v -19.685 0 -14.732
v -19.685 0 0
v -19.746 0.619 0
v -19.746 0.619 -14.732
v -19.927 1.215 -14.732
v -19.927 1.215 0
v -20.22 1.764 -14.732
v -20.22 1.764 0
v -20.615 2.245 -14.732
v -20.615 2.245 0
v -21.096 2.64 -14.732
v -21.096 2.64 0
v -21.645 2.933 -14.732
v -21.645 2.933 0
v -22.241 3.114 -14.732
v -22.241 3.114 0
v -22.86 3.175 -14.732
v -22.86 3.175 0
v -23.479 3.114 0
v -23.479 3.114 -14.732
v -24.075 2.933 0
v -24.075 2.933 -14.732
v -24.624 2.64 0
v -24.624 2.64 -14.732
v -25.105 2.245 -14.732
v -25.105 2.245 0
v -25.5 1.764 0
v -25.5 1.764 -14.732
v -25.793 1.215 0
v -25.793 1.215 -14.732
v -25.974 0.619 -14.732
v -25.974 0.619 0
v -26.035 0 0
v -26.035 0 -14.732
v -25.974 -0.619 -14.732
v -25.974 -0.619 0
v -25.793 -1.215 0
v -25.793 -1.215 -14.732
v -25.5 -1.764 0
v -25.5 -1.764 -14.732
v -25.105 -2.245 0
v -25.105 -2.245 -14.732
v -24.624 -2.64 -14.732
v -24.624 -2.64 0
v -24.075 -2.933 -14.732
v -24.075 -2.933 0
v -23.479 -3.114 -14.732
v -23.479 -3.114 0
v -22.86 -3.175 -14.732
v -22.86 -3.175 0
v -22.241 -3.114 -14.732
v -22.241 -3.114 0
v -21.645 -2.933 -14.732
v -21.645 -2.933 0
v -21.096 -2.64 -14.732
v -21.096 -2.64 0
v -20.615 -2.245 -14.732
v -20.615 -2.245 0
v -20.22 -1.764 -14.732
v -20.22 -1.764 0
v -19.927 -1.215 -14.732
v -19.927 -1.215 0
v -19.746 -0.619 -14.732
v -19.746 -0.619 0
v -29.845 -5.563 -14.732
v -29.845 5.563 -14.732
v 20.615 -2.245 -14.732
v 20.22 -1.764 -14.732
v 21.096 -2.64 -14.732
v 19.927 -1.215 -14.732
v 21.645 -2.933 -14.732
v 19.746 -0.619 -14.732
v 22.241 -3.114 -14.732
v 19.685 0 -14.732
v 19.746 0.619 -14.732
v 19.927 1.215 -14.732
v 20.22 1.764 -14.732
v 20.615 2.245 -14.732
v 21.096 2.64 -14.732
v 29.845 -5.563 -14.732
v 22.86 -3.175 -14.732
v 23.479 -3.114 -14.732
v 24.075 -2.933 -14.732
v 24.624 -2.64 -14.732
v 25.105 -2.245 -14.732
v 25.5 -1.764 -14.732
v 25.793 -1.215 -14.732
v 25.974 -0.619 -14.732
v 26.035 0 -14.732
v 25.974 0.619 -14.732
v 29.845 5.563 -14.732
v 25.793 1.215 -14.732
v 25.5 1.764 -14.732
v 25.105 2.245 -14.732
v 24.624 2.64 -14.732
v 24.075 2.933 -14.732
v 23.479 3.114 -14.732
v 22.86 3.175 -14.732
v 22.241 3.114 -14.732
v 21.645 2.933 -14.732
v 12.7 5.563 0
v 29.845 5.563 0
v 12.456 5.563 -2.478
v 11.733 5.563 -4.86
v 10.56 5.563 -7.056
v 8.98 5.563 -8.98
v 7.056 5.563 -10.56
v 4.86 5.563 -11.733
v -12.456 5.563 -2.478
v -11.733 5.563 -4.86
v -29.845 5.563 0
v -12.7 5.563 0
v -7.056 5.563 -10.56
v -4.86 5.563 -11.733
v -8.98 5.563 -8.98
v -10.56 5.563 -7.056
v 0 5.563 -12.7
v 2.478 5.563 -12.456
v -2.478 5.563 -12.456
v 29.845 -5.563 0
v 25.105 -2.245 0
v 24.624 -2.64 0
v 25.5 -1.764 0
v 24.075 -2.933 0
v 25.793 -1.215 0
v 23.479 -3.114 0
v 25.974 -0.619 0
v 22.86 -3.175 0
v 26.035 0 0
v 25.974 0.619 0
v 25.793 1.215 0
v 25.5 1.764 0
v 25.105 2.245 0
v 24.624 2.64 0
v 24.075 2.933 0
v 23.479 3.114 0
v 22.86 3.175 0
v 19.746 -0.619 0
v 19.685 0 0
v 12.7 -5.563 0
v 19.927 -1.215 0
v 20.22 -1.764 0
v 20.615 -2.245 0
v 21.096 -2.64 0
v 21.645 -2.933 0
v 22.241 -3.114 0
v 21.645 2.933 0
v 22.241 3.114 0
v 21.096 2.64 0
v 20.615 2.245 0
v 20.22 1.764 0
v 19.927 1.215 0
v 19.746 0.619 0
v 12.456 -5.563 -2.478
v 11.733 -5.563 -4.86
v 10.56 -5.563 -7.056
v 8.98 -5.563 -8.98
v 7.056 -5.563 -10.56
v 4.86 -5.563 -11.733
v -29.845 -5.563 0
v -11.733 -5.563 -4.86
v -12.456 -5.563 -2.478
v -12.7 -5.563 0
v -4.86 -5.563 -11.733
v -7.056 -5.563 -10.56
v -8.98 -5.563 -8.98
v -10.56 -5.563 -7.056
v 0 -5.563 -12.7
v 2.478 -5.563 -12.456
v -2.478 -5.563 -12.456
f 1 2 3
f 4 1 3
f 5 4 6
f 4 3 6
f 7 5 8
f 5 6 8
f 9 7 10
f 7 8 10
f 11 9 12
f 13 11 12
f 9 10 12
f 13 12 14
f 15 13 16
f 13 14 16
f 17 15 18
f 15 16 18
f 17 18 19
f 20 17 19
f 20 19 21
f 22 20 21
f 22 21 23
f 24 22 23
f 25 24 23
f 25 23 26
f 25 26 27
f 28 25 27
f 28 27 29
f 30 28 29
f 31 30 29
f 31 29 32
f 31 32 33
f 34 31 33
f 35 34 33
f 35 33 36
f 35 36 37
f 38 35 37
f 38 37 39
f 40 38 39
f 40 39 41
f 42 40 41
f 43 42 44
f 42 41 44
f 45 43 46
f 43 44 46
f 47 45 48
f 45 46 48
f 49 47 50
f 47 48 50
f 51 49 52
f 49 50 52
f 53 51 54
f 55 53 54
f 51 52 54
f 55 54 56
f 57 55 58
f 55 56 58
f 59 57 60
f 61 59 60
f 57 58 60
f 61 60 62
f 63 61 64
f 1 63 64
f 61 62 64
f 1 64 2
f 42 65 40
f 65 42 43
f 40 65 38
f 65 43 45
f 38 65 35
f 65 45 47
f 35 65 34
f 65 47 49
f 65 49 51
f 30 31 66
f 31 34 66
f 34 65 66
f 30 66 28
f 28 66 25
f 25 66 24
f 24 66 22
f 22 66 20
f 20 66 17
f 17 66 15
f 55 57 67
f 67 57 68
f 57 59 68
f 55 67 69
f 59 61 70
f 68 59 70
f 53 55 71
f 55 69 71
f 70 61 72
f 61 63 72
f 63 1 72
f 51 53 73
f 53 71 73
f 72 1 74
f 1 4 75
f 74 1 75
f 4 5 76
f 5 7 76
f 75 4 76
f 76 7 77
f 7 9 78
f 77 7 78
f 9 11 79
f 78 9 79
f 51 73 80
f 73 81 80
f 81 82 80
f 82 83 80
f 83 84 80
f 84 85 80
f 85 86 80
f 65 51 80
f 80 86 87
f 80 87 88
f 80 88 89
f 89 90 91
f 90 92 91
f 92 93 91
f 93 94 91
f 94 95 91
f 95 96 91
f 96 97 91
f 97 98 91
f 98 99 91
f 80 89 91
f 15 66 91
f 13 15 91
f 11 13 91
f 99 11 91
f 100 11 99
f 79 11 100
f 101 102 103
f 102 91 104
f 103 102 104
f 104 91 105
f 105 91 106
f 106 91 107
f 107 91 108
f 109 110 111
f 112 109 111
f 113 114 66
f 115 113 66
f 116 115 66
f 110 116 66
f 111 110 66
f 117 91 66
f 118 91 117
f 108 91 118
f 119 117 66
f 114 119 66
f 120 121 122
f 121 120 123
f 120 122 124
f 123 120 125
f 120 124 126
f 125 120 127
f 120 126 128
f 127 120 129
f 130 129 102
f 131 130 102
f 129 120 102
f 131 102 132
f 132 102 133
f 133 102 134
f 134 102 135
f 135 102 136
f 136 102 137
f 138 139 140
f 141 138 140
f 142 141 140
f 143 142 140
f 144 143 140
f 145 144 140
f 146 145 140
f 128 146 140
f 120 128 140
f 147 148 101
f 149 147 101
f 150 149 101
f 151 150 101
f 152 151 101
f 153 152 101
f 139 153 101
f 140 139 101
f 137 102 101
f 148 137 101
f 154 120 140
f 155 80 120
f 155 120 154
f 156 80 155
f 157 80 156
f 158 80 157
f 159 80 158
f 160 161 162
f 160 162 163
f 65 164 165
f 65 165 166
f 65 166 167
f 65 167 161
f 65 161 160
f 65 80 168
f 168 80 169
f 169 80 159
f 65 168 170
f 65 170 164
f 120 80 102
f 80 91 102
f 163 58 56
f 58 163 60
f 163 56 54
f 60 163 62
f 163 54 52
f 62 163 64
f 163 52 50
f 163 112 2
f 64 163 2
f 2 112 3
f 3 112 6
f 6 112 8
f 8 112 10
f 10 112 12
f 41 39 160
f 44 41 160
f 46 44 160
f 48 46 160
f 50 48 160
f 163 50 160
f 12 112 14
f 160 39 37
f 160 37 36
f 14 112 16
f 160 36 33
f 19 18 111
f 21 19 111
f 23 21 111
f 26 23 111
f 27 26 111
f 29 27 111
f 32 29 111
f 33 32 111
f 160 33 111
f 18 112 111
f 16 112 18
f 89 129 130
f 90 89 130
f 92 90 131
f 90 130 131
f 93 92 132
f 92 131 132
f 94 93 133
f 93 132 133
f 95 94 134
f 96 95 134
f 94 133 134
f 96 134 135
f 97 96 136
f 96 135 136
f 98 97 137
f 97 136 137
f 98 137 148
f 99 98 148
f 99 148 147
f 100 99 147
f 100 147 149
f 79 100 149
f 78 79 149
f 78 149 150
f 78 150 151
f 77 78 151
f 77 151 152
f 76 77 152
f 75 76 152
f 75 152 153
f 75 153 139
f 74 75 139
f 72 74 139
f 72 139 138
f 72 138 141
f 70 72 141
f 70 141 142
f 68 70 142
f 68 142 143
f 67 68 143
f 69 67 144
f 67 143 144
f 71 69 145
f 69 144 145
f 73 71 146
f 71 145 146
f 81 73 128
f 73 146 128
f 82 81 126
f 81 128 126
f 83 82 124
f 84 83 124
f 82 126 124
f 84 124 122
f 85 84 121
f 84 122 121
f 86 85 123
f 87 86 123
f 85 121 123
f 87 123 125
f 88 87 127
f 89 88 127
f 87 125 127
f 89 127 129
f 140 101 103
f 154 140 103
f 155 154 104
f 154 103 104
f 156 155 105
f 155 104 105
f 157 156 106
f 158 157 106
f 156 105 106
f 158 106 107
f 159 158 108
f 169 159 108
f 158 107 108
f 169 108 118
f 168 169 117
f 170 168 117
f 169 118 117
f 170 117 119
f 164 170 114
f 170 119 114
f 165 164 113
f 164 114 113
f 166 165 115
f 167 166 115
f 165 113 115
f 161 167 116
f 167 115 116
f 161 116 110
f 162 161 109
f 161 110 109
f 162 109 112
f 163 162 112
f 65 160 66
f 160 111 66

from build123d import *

# Parameters (mm, degrees)
BOSS_EXTRUDE1_DEPTH = 5.5626
SKETCH2_R           = 3.175
CUT_EXTRUDE1_DEPTH  = 34.744605017


with BuildPart() as part:
    # Sketch1 → Boss-Extrude1 (new, symmetric)
    with BuildSketch(Plane(origin=(0, 0, 0), x_dir=(1, 0, 0), z_dir=(0, 1, 0))):
        with BuildLine():
            Line((-12.7, 0), (-29.845, 0))
            Line((-29.845, 0), (-29.845, 14.732))
            Line((-29.845, 14.732), (29.845, 14.732))
            Line((29.845, 14.732), (29.845, 0))
            Line((29.845, 0), (12.7, 0))
            ThreePointArc((12.7, 0), (0, 12.7), (-12.7, 0))
        make_face()
    extrude(amount=BOSS_EXTRUDE1_DEPTH, both=True)

    # Sketch2 → Cut-Extrude1 (cut, through all)
    with BuildSketch(Plane.XY):
        with Locations((-22.86, 0)):
            Circle(SKETCH2_R)
        with Locations((22.86, 0)):
            Circle(SKETCH2_R)
    extrude(amount=-CUT_EXTRUDE1_DEPTH, mode=Mode.SUBTRACT)


solid = part.part
